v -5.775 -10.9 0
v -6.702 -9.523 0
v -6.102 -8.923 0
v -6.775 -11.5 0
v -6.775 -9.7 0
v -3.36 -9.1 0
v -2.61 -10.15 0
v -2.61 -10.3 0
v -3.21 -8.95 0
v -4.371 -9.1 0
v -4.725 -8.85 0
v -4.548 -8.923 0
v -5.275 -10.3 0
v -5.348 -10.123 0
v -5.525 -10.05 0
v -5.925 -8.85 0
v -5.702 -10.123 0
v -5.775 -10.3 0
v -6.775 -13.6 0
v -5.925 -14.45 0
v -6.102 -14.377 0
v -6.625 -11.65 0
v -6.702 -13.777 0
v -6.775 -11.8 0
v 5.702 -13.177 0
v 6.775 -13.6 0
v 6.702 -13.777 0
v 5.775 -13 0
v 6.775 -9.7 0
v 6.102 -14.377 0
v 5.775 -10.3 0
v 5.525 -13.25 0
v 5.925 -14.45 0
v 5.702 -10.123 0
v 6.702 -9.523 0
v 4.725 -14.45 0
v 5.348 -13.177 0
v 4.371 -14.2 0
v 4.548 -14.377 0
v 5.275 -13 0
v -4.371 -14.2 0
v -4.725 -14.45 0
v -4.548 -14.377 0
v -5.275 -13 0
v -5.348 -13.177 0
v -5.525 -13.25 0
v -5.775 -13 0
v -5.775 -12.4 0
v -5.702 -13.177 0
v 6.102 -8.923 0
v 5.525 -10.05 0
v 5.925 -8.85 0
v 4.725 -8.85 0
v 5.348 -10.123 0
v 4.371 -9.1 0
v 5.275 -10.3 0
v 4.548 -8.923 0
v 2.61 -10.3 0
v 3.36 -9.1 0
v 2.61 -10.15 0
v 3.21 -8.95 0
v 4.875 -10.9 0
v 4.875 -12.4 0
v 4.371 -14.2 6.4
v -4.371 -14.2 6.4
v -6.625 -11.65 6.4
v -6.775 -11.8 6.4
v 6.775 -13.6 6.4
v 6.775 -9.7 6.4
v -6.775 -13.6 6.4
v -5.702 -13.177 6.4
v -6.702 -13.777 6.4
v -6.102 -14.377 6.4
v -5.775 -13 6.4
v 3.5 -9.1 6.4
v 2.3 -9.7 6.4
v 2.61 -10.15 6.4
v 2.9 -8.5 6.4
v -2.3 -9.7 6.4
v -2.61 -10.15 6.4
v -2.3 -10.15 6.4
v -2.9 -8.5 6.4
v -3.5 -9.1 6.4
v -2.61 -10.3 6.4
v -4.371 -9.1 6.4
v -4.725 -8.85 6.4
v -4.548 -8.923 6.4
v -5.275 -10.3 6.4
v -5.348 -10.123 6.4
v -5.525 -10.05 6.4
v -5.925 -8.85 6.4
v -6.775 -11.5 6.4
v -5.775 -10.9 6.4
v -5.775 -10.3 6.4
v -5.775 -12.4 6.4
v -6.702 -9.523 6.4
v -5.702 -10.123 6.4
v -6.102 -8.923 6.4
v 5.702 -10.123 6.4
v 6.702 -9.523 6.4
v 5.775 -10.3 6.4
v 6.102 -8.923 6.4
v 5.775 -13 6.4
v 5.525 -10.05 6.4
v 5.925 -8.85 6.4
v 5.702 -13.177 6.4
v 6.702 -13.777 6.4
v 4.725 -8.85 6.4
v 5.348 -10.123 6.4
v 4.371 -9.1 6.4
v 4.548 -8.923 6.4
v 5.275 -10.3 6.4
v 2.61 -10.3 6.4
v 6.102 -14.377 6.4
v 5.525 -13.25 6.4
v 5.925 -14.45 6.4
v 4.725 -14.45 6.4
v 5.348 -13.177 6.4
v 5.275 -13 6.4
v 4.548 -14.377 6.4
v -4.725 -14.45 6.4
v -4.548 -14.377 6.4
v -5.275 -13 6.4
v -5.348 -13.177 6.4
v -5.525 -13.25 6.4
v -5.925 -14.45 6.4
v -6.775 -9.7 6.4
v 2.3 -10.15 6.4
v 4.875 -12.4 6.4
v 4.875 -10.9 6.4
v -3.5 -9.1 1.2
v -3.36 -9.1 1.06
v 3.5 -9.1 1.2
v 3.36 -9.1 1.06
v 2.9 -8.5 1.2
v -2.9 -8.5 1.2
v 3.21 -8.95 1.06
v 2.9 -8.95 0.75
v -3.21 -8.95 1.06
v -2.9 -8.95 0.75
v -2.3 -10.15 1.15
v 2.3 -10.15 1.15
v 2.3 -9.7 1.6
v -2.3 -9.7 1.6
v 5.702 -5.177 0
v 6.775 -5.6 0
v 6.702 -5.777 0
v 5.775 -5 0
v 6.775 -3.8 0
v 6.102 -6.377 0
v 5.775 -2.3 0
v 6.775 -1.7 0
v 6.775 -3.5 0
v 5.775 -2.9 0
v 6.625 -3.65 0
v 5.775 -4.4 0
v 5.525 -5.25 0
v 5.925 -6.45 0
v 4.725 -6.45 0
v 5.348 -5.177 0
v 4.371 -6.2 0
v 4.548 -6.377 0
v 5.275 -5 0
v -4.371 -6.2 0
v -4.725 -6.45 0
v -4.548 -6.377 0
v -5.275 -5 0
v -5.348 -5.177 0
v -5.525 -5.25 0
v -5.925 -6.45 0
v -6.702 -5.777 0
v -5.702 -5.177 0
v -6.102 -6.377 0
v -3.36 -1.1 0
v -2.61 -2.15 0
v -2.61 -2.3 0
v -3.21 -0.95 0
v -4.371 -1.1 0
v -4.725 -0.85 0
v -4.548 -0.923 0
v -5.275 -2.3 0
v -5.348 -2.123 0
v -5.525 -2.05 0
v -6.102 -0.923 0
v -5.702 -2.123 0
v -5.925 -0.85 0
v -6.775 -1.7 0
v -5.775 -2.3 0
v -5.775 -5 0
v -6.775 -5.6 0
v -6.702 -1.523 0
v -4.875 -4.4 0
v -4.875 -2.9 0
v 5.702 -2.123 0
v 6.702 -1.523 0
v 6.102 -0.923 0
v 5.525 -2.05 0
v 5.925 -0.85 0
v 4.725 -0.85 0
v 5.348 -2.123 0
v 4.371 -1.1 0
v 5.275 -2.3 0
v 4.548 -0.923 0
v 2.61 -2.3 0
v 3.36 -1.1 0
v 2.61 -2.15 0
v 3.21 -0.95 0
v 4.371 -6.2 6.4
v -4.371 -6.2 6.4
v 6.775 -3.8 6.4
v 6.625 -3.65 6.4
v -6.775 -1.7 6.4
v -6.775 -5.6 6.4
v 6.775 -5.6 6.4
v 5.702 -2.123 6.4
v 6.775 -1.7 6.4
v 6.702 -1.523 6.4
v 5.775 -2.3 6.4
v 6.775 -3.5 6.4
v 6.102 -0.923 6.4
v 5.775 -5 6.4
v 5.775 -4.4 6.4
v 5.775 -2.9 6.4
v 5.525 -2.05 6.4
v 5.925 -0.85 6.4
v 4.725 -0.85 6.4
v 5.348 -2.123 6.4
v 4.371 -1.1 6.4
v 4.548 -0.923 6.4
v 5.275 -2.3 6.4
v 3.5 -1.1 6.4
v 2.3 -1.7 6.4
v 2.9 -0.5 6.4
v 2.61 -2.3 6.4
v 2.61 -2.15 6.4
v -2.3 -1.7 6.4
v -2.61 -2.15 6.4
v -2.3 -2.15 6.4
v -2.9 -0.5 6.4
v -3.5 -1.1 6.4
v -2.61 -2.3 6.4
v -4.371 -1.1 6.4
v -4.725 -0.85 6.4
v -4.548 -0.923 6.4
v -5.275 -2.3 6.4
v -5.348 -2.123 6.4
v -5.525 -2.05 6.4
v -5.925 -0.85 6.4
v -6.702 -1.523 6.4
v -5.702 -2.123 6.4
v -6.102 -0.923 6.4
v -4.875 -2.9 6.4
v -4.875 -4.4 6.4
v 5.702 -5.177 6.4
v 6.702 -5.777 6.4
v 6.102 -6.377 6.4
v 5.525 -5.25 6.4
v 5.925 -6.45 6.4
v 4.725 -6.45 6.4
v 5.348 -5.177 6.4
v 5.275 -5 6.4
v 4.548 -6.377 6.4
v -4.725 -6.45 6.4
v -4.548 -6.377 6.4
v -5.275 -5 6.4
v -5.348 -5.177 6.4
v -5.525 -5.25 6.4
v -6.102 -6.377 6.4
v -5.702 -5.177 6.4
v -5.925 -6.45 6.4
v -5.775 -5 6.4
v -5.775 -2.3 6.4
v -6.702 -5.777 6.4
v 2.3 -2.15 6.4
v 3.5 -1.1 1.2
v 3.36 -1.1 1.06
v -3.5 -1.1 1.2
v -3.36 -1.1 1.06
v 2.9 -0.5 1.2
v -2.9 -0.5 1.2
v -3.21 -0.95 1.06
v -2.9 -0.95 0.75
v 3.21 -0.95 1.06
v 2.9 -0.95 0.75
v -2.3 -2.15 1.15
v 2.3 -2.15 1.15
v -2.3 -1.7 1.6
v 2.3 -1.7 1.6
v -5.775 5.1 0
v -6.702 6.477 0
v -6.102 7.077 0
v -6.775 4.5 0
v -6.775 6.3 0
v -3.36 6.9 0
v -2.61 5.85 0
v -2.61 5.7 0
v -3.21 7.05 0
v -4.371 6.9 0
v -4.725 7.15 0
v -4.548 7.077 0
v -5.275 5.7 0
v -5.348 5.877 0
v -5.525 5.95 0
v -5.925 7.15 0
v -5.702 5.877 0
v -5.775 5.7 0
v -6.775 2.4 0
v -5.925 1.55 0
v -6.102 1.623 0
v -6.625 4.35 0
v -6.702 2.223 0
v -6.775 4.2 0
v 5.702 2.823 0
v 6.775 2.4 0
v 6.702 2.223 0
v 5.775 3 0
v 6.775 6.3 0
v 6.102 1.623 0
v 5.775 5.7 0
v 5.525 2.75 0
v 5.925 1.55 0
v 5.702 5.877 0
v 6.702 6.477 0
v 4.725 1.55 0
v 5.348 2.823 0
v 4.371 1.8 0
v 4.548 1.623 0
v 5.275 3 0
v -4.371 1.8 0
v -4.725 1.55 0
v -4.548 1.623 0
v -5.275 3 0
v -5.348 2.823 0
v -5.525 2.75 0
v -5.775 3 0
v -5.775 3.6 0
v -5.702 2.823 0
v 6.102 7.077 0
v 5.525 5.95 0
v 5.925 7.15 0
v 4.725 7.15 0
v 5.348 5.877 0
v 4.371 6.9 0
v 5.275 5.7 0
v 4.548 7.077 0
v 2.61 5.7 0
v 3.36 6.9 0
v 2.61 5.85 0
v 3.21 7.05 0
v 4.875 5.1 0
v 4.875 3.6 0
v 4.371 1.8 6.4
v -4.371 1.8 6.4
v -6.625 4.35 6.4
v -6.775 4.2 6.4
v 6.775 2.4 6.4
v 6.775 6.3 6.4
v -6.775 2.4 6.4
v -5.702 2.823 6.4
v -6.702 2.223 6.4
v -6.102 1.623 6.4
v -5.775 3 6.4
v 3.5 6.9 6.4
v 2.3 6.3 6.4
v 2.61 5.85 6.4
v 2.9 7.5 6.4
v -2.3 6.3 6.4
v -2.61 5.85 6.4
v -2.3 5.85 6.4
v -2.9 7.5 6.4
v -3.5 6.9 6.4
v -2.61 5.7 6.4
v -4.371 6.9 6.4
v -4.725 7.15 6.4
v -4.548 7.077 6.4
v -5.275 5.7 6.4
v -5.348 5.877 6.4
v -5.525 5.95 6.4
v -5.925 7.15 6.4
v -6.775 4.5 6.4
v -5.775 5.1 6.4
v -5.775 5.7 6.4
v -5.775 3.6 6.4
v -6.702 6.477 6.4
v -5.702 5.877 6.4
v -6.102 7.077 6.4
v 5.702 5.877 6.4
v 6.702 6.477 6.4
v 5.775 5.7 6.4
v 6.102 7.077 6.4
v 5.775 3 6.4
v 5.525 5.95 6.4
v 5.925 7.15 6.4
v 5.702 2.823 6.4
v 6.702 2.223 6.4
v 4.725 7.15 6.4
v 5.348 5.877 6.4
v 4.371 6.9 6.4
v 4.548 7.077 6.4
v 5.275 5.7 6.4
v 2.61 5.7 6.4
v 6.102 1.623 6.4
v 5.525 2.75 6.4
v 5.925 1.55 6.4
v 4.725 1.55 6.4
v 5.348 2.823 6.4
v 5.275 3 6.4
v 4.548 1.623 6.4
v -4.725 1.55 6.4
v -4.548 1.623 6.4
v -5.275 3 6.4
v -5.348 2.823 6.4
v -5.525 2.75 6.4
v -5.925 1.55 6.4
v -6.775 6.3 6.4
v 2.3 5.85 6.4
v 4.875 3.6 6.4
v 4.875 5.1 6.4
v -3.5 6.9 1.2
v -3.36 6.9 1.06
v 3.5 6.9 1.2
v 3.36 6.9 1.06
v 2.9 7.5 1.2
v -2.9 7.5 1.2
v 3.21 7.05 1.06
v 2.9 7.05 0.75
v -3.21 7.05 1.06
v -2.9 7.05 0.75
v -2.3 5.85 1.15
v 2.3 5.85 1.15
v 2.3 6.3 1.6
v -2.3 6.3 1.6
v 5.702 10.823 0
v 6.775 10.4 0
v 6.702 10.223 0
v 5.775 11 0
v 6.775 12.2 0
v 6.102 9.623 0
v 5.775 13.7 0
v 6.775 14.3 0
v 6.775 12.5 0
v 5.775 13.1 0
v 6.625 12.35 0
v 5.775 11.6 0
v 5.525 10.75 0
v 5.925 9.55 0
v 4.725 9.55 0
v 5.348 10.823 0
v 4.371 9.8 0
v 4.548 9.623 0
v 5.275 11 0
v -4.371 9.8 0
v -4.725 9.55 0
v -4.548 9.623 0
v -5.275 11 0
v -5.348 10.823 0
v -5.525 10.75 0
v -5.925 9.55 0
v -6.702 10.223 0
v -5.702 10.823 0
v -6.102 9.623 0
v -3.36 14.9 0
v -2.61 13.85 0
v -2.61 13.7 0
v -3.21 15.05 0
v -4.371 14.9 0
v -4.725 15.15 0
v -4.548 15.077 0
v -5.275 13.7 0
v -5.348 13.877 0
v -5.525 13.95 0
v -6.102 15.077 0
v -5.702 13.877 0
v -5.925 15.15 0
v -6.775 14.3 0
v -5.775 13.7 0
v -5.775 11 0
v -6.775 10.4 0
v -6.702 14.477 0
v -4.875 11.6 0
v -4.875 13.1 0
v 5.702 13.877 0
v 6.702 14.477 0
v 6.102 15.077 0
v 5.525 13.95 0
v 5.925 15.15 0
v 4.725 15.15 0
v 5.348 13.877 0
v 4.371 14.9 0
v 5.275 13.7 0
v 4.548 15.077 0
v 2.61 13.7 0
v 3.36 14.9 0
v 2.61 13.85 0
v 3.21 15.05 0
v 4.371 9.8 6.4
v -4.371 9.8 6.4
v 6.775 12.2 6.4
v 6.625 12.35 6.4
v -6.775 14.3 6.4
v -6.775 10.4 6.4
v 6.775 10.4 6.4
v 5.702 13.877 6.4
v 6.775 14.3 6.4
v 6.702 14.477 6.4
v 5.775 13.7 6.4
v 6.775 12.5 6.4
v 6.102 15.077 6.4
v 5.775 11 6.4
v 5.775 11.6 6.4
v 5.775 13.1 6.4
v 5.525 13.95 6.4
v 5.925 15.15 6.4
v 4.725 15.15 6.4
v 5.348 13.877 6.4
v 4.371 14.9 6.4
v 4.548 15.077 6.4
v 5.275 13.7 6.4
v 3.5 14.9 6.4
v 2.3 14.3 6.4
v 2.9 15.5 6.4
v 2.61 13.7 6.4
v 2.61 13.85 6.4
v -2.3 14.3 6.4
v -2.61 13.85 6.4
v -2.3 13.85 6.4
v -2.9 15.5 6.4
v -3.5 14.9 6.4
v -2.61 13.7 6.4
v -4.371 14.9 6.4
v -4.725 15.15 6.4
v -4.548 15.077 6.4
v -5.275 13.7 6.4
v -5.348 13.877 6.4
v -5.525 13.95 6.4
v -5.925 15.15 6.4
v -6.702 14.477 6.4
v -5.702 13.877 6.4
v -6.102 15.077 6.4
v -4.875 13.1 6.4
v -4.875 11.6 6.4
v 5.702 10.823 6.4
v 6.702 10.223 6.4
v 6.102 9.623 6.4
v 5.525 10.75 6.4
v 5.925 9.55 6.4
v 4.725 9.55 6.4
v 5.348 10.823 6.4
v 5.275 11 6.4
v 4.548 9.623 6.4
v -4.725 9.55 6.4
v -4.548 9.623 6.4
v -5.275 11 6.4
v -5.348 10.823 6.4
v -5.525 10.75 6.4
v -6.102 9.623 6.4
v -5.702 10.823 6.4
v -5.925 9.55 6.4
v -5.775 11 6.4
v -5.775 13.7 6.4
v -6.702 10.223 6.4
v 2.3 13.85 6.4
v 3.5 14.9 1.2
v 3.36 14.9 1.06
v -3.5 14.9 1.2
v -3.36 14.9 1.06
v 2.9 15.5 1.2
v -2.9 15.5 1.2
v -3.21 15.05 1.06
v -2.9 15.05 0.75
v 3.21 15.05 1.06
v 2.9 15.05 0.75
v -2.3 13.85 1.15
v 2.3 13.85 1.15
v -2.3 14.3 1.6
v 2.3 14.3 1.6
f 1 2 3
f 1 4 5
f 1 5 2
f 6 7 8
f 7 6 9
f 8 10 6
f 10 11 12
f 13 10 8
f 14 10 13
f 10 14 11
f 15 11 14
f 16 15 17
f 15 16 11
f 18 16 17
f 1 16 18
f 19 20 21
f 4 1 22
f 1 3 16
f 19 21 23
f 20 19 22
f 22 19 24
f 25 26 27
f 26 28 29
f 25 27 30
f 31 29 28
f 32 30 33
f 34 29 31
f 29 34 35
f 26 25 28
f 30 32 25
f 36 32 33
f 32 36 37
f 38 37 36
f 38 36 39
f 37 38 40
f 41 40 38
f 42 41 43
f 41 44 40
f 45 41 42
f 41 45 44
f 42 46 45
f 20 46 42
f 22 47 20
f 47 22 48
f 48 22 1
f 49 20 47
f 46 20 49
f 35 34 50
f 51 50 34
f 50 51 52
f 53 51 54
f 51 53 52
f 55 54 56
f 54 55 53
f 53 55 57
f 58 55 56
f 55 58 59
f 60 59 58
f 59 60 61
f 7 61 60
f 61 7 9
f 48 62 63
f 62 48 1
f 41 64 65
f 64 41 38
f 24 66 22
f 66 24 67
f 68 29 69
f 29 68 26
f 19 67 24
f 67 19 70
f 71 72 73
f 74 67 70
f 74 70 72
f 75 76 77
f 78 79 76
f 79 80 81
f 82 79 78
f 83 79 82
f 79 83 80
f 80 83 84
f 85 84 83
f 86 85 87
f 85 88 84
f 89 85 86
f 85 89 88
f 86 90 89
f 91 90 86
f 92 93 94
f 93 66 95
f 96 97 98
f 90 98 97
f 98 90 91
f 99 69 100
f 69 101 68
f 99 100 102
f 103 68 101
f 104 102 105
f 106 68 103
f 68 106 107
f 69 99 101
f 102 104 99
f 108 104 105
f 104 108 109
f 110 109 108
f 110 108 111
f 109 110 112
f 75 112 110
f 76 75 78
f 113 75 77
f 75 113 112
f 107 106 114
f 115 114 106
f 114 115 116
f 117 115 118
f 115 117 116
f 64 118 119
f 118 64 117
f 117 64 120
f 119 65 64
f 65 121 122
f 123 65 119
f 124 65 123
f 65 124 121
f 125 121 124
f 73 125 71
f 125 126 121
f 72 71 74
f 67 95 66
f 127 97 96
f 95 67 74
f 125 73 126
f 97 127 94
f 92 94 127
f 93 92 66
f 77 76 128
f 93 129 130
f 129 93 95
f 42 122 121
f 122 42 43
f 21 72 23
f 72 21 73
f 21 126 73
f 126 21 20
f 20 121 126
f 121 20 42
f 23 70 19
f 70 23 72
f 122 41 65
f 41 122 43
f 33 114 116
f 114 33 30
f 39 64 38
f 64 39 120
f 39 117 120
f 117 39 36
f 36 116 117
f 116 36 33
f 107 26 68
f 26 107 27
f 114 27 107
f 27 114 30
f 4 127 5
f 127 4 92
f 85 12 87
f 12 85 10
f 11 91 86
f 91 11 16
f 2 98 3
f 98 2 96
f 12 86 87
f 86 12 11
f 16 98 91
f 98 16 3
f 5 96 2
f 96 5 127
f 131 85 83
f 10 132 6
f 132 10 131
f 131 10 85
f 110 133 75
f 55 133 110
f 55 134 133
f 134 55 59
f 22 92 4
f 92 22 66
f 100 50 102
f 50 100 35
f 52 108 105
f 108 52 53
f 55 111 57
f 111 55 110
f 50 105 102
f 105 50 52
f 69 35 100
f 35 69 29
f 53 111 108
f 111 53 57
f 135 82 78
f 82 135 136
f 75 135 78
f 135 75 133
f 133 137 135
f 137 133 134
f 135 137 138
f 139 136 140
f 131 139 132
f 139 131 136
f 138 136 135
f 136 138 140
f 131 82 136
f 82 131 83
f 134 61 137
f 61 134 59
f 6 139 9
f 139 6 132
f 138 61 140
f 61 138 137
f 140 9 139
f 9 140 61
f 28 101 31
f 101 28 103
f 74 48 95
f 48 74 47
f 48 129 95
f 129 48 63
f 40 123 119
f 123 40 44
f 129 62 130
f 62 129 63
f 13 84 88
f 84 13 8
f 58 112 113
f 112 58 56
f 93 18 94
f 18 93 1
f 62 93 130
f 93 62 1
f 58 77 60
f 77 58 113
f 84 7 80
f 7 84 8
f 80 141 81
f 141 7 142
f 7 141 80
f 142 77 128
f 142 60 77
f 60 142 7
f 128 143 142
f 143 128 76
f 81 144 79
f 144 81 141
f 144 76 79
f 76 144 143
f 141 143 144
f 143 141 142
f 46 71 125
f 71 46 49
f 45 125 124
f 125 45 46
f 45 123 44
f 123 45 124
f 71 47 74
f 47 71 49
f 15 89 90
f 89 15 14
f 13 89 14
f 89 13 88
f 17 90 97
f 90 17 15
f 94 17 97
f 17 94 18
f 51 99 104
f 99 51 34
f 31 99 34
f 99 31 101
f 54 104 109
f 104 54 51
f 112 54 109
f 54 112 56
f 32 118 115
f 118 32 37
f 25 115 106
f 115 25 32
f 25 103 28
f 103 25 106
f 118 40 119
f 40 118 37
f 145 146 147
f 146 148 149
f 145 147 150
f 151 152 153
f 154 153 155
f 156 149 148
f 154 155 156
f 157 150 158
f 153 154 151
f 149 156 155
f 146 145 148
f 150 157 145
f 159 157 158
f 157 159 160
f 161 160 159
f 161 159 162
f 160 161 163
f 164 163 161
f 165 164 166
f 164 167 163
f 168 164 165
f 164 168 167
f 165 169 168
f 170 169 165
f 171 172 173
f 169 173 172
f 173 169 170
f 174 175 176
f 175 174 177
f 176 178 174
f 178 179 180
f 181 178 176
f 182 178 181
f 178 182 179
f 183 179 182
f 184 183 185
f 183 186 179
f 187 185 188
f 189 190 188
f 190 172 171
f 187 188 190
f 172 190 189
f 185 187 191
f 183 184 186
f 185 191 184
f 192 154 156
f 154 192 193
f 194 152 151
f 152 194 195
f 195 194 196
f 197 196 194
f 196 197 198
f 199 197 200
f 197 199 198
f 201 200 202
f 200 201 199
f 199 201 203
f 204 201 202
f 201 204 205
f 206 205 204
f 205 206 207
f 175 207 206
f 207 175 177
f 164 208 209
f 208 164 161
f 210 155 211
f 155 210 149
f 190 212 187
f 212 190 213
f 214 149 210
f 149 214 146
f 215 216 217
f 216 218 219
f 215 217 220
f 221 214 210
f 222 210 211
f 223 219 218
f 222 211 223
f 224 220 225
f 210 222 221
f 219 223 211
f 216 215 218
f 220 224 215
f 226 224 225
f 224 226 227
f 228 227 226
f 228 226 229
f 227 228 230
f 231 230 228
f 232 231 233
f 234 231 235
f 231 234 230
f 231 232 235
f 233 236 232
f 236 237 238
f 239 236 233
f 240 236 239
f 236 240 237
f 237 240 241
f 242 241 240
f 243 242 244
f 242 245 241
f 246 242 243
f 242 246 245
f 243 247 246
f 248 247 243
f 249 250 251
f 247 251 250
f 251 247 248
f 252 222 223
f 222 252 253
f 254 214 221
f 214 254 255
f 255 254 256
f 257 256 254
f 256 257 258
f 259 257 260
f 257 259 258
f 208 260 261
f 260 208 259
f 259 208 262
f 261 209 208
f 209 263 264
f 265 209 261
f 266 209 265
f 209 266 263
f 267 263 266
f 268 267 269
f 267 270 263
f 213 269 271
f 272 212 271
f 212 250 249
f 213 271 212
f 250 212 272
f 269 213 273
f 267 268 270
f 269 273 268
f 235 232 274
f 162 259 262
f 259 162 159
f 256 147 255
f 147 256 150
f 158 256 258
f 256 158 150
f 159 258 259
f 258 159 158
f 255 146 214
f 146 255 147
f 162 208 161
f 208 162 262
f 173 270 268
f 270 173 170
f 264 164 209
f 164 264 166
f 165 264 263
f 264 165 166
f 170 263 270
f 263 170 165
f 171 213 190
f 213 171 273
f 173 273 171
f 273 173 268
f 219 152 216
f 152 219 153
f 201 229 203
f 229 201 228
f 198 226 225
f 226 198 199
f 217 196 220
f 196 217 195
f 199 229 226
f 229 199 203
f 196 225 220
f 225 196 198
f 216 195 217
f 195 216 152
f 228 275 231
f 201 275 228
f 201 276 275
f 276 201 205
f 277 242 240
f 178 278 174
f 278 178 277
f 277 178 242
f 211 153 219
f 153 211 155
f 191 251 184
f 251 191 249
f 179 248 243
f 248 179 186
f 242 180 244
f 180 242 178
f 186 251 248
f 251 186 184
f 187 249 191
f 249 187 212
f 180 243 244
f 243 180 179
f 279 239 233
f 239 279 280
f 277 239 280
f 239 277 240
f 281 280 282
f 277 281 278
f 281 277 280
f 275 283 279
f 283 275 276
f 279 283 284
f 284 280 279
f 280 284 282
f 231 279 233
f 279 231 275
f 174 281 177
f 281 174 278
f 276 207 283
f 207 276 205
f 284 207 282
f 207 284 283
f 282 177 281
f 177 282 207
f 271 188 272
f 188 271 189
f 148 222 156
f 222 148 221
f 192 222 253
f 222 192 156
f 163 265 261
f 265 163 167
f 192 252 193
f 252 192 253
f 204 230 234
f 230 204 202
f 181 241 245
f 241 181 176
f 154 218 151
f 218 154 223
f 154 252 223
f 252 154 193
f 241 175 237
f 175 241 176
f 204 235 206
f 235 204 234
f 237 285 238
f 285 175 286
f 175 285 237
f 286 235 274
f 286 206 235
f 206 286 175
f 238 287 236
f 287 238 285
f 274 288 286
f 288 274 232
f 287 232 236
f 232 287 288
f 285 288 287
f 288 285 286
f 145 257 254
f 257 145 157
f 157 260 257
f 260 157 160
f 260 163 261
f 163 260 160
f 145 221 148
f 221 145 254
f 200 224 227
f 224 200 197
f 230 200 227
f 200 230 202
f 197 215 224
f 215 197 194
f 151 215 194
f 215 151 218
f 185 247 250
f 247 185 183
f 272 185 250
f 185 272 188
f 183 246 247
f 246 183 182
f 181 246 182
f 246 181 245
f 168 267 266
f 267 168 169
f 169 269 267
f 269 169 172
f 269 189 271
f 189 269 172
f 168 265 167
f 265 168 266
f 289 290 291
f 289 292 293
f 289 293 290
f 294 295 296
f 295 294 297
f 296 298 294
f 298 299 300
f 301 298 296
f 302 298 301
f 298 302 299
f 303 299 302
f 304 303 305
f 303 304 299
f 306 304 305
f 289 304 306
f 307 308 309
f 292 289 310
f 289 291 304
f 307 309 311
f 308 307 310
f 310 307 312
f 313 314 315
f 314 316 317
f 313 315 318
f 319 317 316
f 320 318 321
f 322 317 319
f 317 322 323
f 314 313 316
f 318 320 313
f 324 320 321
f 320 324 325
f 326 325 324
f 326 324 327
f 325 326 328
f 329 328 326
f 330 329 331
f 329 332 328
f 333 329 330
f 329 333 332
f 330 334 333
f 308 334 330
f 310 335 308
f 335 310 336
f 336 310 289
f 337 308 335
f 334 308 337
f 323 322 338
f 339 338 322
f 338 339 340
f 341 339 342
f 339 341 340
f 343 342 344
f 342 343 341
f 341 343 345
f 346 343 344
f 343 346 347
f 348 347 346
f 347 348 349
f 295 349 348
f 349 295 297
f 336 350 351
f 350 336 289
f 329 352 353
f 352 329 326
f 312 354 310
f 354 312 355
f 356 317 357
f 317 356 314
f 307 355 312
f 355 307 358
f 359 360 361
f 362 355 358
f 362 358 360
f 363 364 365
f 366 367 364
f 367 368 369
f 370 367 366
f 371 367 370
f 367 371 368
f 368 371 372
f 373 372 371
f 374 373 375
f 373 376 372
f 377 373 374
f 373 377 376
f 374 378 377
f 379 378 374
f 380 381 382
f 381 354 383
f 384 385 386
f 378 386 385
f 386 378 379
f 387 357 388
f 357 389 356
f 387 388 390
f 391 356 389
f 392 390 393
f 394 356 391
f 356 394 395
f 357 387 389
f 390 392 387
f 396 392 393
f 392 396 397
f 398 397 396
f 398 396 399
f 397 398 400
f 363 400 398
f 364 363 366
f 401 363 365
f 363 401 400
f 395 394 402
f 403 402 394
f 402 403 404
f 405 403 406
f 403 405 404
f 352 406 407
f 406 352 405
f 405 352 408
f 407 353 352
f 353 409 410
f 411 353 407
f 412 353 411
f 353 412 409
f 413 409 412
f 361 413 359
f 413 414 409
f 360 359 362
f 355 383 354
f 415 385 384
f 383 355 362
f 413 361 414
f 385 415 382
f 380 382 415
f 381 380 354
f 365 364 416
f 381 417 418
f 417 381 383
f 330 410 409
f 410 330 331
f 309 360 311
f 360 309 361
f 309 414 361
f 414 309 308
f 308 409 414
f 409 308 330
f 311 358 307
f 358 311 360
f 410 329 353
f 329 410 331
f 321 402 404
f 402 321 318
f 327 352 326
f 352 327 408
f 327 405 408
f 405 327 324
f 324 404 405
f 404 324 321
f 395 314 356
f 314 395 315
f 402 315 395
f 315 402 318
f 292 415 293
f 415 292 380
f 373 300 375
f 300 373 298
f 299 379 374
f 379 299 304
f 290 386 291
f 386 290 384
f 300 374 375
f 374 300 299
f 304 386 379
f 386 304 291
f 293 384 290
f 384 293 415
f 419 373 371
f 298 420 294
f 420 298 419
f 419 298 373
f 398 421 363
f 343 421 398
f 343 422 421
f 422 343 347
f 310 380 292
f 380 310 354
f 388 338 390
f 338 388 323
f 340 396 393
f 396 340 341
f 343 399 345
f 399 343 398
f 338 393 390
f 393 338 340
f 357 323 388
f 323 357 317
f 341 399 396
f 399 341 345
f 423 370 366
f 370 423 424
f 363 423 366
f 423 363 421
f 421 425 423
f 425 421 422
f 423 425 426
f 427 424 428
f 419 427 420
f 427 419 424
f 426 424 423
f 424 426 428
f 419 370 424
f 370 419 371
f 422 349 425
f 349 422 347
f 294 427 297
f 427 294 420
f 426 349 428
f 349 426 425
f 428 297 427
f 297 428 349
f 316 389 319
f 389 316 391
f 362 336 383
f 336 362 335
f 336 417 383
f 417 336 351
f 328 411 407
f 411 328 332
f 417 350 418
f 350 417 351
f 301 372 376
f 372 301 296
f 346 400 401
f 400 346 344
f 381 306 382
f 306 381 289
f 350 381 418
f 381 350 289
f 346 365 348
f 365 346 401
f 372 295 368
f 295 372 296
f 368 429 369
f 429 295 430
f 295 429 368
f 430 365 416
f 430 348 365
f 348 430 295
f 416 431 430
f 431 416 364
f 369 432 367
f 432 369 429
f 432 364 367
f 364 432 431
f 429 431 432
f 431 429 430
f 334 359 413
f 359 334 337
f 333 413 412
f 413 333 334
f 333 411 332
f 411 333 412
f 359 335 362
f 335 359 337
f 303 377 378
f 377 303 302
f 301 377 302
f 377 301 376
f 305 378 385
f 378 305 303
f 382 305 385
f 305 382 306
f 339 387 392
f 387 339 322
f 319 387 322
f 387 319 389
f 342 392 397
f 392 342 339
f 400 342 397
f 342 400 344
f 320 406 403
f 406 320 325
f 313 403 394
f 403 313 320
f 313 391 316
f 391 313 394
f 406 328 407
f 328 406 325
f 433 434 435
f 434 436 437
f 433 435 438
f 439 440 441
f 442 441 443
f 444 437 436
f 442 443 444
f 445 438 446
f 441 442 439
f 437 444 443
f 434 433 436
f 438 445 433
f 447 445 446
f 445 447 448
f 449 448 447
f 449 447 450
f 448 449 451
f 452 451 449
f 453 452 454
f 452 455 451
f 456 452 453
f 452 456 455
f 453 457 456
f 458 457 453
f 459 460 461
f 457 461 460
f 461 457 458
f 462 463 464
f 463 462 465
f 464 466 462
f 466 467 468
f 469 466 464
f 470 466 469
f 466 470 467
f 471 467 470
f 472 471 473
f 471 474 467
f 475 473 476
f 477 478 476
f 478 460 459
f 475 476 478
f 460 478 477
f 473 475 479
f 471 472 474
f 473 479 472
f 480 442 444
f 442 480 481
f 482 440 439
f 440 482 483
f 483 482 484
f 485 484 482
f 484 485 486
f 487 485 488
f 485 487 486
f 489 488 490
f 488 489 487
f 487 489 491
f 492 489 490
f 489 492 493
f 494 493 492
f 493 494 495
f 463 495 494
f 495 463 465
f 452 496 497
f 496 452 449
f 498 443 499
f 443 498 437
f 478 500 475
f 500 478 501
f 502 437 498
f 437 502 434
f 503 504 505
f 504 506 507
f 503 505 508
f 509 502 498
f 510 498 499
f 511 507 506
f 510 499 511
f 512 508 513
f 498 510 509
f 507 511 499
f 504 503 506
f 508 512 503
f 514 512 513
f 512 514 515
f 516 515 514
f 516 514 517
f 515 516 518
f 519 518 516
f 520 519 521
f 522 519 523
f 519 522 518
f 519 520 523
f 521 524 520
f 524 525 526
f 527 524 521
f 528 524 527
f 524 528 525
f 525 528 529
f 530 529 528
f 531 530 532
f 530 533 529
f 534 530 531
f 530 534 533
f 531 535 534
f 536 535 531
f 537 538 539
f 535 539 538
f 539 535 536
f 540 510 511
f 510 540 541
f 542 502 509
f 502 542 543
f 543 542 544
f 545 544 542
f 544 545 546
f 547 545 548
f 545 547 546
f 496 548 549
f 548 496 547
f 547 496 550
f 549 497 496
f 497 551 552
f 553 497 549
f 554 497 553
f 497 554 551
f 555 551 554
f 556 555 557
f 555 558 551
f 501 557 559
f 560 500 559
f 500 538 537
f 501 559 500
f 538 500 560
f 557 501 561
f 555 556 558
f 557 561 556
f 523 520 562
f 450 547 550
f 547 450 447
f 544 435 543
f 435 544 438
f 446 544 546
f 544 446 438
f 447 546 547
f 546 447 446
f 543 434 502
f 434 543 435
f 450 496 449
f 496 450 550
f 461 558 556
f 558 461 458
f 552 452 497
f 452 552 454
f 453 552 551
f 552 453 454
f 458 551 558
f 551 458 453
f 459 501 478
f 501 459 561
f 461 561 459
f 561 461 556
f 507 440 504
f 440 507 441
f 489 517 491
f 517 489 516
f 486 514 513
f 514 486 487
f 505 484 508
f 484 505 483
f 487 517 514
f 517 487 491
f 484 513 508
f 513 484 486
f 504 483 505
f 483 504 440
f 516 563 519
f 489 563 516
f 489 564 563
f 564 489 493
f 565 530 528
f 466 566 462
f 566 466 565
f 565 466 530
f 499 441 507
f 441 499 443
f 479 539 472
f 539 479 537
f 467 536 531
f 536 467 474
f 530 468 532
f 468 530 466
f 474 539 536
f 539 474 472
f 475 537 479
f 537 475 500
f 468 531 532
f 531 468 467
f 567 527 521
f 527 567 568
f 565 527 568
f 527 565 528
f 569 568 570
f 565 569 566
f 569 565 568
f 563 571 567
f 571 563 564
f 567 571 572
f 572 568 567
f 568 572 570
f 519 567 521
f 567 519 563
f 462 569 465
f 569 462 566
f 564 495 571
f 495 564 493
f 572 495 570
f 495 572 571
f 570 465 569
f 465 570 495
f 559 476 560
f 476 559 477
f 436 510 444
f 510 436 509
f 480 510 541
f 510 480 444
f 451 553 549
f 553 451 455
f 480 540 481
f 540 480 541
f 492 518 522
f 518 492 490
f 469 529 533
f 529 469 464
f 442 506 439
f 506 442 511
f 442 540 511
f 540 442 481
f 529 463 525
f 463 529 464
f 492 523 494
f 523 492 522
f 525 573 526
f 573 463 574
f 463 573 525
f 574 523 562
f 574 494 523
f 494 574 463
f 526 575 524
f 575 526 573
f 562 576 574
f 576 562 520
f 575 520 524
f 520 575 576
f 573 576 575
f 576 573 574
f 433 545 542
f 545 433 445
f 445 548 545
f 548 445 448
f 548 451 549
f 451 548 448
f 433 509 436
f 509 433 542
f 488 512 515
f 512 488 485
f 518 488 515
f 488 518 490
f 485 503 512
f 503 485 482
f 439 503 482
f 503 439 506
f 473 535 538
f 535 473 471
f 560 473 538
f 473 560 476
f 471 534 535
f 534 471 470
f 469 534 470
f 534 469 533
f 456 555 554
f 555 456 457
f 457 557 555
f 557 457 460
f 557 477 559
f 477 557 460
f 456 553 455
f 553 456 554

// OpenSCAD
// Piece to repair MOREL LIGHTEC glasses arm spring

global_wall_th=0.4;

render_part="arm_spring_clamp_holes";
//render_part="arm_spring_clamp_body";
render_part="arm_spring_clamp_min_body";
render_part="arm_spring_clamp_min";
//render_part="arm_spring_clamp";
//render_part="arm_spring_clamp_multiples";
render_part="arm_spring_clamp_min_multiples";

module arm_spring_clamp_holes(delta=0.4,offset_spring=0.4,extend_bottom=0.1,extend_top=0.1
	,outer_h=3.11,outer_w=10.65,outer_l=3.0,gap_w=4.72,wall_th=0.4,spring_th=0.6,spring_w=4.1,sheet_th=0.4,side_open=1) {
    translate([0,0,-extend_bottom]) union() {
        translate([-(outer_w+delta)/2,0,0]) cube([outer_w+delta,sheet_th,outer_l+2*wall_th+extend_bottom+extend_top],center=false);
        translate([side_open*(outer_w+delta-1.5*sheet_th)/2,0,0]) translate([-1.5*sheet_th/2,0,0]) cube([1.5*sheet_th,outer_h,outer_l+2*wall_th+extend_bottom+extend_top],center=false);
        translate([-(outer_w+delta)/2,outer_h-sheet_th,0]) cube([outer_w+delta,sheet_th,outer_l+2*wall_th+extend_bottom+extend_top],center=false);
        translate([-gap_w/2-delta/2,outer_h-sheet_th,0]) cube([gap_w+delta,sheet_th+spring_th/4,outer_l+2*wall_th+extend_bottom+extend_top],center=false);
        translate([-spring_w/2-delta/2,outer_h-sheet_th,offset_spring+wall_th+extend_bottom])
		cube([spring_w+delta,sheet_th+spring_th,outer_l+extend_top+wall_th-offset_spring],center=false);
        translate([0,outer_h,offset_spring+wall_th+extend_bottom])
		rotate([45,0,0]) cube([spring_w+delta,sqrt(2)*spring_th,sqrt(2)*spring_th],center=true);
        translate([-outer_w/2,0]) cylinder(r=delta/2,h=outer_l+2*wall_th+extend_bottom+extend_top,center=false,$fn=8);
        translate([-outer_w/2,outer_h]) cylinder(r=delta/2,h=outer_l+2*wall_th+extend_bottom+extend_top,center=false,$fn=8);
        translate([outer_w/2,outer_h]) cylinder(r=delta/2,h=outer_l+2*wall_th+extend_bottom+extend_top,center=false,$fn=8);
        translate([outer_w/2,0]) cylinder(r=delta/2,h=outer_l+2*wall_th++extend_bottom+extend_top,center=false,$fn=8);
    }
}

if(render_part=="arm_spring_clamp_holes") {
  arm_spring_clamp_holes();
}

module arm_spring_clamp_body(delta=0.4,outer_h=3.11,outer_w=10.65,outer_l=3.0,gap_w=4.72,wall_th=0.4,spring_th=0.6,spring_w=4.1) {
  translate([0,0,wall_th]) minkowski() {
    union() {
        translate([-outer_w/2,0,0]) cube([outer_w,outer_h,outer_l],center=false);
        translate([-gap_w/2-delta/2,0,0]) cube([gap_w+delta,outer_h+spring_th/4,outer_l],center=false);
        translate([-spring_w/2-delta/2,0,0]) cube([spring_w+delta,outer_h+spring_th,outer_l],center=false);
    }
    render() union() {
	translate([0,0,delta/2]) sphere(r=wall_th+delta/2,$fn=8);
	cylinder(r=wall_th/2+1.5*delta,h=2*wall_th,$fn=8,center=true);
    }
  }
}

if(render_part=="arm_spring_clamp_body") {
  arm_spring_clamp_body();
}

module arm_spring_clamp_min_body(delta=0.4,outer_h=3.11,outer_w=10.65,outer_l=3.0,gap_w=4.72,wall_th=0.4,spring_th=0.6,spring_w=4.1,sheet_th=0.4) {
  minkowski() {
	translate([0,0,wall_th]) arm_spring_clamp_holes(delta=delta,offset_spring=0,outer_h=outer_h,outer_l=outer_l-2*wall_th,gap_w=gap_w,wall_th=wall_th,spring_th=spring_th,spring_w=spring_w,extend_bottom=0,extend_top=0,sheet_th=sheet_th);
	render() hull() {
	  cube([wall_th,2*wall_th,2*wall_th],center=true);
	  cube([2*wall_th,wall_th,2*wall_th],center=true);
	}
  }
}

if(render_part=="arm_spring_clamp_min_body") {
  arm_spring_clamp_min_body();
}

module arm_spring_clamp_min(delta=0.4,offset_spring=0.4,outer_h=3.11,outer_w=10.65,outer_l=3.0,gap_w=4.72,wall_th=0.4,spring_th=0.6,spring_w=4.1,sheet_th=0.4) {
  difference() {
	arm_spring_clamp_min_body(delta=delta,outer_h=outer_h,outer_w=outer_w,outer_l=outer_l,gap_w=gap_w,wall_th=wall_th,spring_th=spring_th,spring_w=spring_w,sheet_th=sheet_th);
	arm_spring_clamp_holes(delta=delta,offset_spring=offset_spring,outer_h=outer_h,outer_w=outer_w,outer_l=outer_l,gap_w=gap_w,wall_th=wall_th,spring_th=spring_th,spring_w=spring_w,sheet_th=sheet_th);
  }
}

if(render_part=="arm_spring_clamp_min") {
  arm_spring_clamp_min(wall_th=2*global_wall_th,delta=0.5,outer_h=2.6);
}

module arm_spring_clamp(delta=0.4,outer_h=3.11,outer_w=10.65,outer_l=3.0,gap_w=4.72,wall_th=0.4,spring_th=0.6,spring_w=4.1) {
    difference() {
        arm_spring_clamp_body(delta=delta,outer_h=outer_h,outer_w=outer_w,outer_l=outer_l,gap_w=gap_w,wall_th=wall_th,spring_th=spring_th,spring_w=spring_w);
        arm_spring_clamp_holes(delta=delta,outer_h=outer_h,outer_w=outer_w,outer_l=outer_l,gap_w=gap_w,wall_th=wall_th,spring_th=spring_th,spring_w=spring_w);
    }
}

if(render_part=="arm_spring_clamp") {
  arm_spring_clamp(wall_th=0.8);
}

if(render_part=="arm_spring_clamp_multiples") {
  for(i=[-1:1]) translate([0,i*10.0])
    arm_spring_clamp(wall_th=5*global_wall_th,delta=0.5,outer_h=2.6);
}

if(render_part=="arm_spring_clamp_min_multiples") {
  for(i=[-2:1]) translate([0,i*8.0+3])
    if(abs(i%2)==0) {
      arm_spring_clamp_min(wall_th=3*global_wall_th,delta=0.5,outer_h=2.7,outer_l=4.0,sheet_th=0.6,outer_w=10.65+global_wall_th,spring_th=0.6);
    } else if(abs(i%2)==1) {
      mirror([1,0,0]) arm_spring_clamp_min(wall_th=3*global_wall_th,delta=0.5,outer_h=2.7,outer_l=4.0,sheet_th=0.6,outer_w=10.65+global_wall_th,spring_th=0.6);
    }
}
